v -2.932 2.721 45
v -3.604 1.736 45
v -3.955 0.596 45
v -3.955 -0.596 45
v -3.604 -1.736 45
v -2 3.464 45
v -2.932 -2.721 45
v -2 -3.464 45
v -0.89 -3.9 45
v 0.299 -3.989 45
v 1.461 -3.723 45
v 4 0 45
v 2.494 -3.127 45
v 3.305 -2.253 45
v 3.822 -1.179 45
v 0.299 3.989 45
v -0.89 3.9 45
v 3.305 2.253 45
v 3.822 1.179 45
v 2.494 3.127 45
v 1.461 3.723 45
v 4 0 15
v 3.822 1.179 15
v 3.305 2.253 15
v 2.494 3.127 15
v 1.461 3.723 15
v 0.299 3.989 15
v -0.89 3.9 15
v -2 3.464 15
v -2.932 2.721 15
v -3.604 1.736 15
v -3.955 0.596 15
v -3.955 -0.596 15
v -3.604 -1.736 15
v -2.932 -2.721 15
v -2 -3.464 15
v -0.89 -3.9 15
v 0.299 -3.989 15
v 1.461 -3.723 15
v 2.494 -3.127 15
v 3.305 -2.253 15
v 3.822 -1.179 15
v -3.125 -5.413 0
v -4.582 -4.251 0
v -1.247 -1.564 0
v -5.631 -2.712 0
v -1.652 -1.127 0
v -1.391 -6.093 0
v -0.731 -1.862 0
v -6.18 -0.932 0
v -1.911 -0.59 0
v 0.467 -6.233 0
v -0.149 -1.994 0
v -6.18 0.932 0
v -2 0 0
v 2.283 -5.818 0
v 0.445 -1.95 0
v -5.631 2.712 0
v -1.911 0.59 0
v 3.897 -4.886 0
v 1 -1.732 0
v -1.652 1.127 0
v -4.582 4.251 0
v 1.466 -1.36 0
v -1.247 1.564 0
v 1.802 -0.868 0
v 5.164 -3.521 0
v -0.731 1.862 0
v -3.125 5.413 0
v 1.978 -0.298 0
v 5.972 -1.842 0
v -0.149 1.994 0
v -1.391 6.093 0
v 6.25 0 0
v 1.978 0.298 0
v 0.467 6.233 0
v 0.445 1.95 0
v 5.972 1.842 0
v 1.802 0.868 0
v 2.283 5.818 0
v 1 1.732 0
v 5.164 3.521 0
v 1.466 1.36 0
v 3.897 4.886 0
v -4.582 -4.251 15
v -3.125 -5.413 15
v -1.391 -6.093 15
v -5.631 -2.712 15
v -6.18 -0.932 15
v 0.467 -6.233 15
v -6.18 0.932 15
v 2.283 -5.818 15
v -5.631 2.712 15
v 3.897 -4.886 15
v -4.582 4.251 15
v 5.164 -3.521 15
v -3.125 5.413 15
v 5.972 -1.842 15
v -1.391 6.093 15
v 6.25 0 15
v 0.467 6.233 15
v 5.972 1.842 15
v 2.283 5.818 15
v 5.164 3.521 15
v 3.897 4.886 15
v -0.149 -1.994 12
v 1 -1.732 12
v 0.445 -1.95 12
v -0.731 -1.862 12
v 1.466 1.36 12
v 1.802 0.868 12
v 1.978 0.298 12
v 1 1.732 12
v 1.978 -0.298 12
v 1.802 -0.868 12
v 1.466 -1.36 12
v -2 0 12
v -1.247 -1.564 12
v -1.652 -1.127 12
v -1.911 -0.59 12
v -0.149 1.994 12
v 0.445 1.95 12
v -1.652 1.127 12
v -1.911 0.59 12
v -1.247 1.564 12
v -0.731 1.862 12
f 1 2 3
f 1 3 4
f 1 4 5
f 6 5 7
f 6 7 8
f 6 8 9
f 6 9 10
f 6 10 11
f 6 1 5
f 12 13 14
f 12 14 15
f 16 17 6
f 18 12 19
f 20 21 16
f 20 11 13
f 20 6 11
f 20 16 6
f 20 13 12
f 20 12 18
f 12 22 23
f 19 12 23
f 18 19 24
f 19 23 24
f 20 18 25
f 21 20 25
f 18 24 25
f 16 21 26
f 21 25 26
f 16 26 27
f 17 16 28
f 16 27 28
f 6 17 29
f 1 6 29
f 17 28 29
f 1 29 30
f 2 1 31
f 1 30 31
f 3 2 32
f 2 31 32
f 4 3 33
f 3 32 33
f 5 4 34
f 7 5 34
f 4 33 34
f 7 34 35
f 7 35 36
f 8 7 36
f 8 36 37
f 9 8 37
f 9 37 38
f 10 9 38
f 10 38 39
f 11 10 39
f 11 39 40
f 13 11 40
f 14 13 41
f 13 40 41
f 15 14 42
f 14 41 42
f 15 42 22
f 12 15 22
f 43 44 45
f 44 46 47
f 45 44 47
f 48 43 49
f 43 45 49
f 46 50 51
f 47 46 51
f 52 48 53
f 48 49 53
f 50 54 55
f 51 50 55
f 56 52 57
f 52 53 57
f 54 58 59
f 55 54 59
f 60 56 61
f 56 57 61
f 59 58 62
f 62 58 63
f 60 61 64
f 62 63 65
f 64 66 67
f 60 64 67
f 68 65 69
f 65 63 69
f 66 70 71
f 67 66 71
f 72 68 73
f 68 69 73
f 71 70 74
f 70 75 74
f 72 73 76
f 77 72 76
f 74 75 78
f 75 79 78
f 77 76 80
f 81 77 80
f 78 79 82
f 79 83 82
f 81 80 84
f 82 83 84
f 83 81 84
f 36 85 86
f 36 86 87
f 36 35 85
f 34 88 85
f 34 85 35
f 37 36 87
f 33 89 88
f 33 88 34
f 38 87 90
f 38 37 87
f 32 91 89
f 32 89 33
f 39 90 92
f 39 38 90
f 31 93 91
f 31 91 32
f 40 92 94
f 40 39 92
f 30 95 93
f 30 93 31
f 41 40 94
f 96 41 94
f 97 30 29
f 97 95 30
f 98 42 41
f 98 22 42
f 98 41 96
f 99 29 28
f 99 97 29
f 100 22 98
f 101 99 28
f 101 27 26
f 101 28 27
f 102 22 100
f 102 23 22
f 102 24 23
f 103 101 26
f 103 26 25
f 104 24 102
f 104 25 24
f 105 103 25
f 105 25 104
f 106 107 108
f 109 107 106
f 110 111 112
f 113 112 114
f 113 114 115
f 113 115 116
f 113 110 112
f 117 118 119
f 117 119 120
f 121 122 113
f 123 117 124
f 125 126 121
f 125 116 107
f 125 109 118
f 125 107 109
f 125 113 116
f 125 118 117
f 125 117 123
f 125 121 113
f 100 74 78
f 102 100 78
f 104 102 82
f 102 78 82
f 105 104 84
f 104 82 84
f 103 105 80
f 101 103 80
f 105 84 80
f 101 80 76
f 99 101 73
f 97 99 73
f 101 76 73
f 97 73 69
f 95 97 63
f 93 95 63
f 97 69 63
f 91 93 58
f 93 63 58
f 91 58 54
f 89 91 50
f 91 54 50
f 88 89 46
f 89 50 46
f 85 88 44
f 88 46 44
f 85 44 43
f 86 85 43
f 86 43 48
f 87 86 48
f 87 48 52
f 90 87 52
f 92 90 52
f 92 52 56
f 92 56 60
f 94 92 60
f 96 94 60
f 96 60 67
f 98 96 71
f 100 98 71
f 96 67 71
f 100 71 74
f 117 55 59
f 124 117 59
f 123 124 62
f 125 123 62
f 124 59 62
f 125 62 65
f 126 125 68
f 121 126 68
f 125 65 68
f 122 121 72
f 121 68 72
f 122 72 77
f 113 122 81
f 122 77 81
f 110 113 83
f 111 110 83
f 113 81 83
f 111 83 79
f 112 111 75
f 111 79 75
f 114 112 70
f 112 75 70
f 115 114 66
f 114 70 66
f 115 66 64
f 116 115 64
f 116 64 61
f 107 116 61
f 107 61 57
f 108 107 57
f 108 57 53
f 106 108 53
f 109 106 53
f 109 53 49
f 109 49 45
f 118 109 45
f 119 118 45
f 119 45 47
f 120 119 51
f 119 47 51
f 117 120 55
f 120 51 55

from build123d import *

# Parameters (mm, degrees)
SKETCH1_R           = 6.25
SKETCH1_R_2         = 4
BOSS_EXTRUDE1_DEPTH = 15
BOSS_EXTRUDE2_START = 15
SKETCH1_3_R         = 4
BOSS_EXTRUDE2_DEPTH = 30
SKETCH2_R           = 2
CUT_EXTRUDE1_DEPTH  = 12


with BuildPart() as part:
    # Sketch1 → Boss-Extrude1 (new body)
    # profile 1 of 2: a face of its own
    with BuildSketch(Plane.XY):
        Circle(SKETCH1_R)
        Circle(SKETCH1_R_2, mode=Mode.SUBTRACT)
    # profile 2 of 2: a face of its own
    with BuildSketch(Plane.XY):
        Circle(SKETCH1_R_2)
    extrude(amount=BOSS_EXTRUDE1_DEPTH)

    # Sketch1<3> → Boss-Extrude2 (add)
    with BuildSketch(Plane.XY.offset(BOSS_EXTRUDE2_START)):
        Circle(SKETCH1_3_R)
    extrude(amount=BOSS_EXTRUDE2_DEPTH)

    # Sketch2 → Cut-Extrude1 (cut)
    with BuildSketch(Plane(origin=(0, 0, 0), x_dir=(-1, 0, 0), z_dir=(0, 0, -1))):
        Circle(SKETCH2_R)
    extrude(amount=-CUT_EXTRUDE1_DEPTH, mode=Mode.SUBTRACT)


solid = part.part
